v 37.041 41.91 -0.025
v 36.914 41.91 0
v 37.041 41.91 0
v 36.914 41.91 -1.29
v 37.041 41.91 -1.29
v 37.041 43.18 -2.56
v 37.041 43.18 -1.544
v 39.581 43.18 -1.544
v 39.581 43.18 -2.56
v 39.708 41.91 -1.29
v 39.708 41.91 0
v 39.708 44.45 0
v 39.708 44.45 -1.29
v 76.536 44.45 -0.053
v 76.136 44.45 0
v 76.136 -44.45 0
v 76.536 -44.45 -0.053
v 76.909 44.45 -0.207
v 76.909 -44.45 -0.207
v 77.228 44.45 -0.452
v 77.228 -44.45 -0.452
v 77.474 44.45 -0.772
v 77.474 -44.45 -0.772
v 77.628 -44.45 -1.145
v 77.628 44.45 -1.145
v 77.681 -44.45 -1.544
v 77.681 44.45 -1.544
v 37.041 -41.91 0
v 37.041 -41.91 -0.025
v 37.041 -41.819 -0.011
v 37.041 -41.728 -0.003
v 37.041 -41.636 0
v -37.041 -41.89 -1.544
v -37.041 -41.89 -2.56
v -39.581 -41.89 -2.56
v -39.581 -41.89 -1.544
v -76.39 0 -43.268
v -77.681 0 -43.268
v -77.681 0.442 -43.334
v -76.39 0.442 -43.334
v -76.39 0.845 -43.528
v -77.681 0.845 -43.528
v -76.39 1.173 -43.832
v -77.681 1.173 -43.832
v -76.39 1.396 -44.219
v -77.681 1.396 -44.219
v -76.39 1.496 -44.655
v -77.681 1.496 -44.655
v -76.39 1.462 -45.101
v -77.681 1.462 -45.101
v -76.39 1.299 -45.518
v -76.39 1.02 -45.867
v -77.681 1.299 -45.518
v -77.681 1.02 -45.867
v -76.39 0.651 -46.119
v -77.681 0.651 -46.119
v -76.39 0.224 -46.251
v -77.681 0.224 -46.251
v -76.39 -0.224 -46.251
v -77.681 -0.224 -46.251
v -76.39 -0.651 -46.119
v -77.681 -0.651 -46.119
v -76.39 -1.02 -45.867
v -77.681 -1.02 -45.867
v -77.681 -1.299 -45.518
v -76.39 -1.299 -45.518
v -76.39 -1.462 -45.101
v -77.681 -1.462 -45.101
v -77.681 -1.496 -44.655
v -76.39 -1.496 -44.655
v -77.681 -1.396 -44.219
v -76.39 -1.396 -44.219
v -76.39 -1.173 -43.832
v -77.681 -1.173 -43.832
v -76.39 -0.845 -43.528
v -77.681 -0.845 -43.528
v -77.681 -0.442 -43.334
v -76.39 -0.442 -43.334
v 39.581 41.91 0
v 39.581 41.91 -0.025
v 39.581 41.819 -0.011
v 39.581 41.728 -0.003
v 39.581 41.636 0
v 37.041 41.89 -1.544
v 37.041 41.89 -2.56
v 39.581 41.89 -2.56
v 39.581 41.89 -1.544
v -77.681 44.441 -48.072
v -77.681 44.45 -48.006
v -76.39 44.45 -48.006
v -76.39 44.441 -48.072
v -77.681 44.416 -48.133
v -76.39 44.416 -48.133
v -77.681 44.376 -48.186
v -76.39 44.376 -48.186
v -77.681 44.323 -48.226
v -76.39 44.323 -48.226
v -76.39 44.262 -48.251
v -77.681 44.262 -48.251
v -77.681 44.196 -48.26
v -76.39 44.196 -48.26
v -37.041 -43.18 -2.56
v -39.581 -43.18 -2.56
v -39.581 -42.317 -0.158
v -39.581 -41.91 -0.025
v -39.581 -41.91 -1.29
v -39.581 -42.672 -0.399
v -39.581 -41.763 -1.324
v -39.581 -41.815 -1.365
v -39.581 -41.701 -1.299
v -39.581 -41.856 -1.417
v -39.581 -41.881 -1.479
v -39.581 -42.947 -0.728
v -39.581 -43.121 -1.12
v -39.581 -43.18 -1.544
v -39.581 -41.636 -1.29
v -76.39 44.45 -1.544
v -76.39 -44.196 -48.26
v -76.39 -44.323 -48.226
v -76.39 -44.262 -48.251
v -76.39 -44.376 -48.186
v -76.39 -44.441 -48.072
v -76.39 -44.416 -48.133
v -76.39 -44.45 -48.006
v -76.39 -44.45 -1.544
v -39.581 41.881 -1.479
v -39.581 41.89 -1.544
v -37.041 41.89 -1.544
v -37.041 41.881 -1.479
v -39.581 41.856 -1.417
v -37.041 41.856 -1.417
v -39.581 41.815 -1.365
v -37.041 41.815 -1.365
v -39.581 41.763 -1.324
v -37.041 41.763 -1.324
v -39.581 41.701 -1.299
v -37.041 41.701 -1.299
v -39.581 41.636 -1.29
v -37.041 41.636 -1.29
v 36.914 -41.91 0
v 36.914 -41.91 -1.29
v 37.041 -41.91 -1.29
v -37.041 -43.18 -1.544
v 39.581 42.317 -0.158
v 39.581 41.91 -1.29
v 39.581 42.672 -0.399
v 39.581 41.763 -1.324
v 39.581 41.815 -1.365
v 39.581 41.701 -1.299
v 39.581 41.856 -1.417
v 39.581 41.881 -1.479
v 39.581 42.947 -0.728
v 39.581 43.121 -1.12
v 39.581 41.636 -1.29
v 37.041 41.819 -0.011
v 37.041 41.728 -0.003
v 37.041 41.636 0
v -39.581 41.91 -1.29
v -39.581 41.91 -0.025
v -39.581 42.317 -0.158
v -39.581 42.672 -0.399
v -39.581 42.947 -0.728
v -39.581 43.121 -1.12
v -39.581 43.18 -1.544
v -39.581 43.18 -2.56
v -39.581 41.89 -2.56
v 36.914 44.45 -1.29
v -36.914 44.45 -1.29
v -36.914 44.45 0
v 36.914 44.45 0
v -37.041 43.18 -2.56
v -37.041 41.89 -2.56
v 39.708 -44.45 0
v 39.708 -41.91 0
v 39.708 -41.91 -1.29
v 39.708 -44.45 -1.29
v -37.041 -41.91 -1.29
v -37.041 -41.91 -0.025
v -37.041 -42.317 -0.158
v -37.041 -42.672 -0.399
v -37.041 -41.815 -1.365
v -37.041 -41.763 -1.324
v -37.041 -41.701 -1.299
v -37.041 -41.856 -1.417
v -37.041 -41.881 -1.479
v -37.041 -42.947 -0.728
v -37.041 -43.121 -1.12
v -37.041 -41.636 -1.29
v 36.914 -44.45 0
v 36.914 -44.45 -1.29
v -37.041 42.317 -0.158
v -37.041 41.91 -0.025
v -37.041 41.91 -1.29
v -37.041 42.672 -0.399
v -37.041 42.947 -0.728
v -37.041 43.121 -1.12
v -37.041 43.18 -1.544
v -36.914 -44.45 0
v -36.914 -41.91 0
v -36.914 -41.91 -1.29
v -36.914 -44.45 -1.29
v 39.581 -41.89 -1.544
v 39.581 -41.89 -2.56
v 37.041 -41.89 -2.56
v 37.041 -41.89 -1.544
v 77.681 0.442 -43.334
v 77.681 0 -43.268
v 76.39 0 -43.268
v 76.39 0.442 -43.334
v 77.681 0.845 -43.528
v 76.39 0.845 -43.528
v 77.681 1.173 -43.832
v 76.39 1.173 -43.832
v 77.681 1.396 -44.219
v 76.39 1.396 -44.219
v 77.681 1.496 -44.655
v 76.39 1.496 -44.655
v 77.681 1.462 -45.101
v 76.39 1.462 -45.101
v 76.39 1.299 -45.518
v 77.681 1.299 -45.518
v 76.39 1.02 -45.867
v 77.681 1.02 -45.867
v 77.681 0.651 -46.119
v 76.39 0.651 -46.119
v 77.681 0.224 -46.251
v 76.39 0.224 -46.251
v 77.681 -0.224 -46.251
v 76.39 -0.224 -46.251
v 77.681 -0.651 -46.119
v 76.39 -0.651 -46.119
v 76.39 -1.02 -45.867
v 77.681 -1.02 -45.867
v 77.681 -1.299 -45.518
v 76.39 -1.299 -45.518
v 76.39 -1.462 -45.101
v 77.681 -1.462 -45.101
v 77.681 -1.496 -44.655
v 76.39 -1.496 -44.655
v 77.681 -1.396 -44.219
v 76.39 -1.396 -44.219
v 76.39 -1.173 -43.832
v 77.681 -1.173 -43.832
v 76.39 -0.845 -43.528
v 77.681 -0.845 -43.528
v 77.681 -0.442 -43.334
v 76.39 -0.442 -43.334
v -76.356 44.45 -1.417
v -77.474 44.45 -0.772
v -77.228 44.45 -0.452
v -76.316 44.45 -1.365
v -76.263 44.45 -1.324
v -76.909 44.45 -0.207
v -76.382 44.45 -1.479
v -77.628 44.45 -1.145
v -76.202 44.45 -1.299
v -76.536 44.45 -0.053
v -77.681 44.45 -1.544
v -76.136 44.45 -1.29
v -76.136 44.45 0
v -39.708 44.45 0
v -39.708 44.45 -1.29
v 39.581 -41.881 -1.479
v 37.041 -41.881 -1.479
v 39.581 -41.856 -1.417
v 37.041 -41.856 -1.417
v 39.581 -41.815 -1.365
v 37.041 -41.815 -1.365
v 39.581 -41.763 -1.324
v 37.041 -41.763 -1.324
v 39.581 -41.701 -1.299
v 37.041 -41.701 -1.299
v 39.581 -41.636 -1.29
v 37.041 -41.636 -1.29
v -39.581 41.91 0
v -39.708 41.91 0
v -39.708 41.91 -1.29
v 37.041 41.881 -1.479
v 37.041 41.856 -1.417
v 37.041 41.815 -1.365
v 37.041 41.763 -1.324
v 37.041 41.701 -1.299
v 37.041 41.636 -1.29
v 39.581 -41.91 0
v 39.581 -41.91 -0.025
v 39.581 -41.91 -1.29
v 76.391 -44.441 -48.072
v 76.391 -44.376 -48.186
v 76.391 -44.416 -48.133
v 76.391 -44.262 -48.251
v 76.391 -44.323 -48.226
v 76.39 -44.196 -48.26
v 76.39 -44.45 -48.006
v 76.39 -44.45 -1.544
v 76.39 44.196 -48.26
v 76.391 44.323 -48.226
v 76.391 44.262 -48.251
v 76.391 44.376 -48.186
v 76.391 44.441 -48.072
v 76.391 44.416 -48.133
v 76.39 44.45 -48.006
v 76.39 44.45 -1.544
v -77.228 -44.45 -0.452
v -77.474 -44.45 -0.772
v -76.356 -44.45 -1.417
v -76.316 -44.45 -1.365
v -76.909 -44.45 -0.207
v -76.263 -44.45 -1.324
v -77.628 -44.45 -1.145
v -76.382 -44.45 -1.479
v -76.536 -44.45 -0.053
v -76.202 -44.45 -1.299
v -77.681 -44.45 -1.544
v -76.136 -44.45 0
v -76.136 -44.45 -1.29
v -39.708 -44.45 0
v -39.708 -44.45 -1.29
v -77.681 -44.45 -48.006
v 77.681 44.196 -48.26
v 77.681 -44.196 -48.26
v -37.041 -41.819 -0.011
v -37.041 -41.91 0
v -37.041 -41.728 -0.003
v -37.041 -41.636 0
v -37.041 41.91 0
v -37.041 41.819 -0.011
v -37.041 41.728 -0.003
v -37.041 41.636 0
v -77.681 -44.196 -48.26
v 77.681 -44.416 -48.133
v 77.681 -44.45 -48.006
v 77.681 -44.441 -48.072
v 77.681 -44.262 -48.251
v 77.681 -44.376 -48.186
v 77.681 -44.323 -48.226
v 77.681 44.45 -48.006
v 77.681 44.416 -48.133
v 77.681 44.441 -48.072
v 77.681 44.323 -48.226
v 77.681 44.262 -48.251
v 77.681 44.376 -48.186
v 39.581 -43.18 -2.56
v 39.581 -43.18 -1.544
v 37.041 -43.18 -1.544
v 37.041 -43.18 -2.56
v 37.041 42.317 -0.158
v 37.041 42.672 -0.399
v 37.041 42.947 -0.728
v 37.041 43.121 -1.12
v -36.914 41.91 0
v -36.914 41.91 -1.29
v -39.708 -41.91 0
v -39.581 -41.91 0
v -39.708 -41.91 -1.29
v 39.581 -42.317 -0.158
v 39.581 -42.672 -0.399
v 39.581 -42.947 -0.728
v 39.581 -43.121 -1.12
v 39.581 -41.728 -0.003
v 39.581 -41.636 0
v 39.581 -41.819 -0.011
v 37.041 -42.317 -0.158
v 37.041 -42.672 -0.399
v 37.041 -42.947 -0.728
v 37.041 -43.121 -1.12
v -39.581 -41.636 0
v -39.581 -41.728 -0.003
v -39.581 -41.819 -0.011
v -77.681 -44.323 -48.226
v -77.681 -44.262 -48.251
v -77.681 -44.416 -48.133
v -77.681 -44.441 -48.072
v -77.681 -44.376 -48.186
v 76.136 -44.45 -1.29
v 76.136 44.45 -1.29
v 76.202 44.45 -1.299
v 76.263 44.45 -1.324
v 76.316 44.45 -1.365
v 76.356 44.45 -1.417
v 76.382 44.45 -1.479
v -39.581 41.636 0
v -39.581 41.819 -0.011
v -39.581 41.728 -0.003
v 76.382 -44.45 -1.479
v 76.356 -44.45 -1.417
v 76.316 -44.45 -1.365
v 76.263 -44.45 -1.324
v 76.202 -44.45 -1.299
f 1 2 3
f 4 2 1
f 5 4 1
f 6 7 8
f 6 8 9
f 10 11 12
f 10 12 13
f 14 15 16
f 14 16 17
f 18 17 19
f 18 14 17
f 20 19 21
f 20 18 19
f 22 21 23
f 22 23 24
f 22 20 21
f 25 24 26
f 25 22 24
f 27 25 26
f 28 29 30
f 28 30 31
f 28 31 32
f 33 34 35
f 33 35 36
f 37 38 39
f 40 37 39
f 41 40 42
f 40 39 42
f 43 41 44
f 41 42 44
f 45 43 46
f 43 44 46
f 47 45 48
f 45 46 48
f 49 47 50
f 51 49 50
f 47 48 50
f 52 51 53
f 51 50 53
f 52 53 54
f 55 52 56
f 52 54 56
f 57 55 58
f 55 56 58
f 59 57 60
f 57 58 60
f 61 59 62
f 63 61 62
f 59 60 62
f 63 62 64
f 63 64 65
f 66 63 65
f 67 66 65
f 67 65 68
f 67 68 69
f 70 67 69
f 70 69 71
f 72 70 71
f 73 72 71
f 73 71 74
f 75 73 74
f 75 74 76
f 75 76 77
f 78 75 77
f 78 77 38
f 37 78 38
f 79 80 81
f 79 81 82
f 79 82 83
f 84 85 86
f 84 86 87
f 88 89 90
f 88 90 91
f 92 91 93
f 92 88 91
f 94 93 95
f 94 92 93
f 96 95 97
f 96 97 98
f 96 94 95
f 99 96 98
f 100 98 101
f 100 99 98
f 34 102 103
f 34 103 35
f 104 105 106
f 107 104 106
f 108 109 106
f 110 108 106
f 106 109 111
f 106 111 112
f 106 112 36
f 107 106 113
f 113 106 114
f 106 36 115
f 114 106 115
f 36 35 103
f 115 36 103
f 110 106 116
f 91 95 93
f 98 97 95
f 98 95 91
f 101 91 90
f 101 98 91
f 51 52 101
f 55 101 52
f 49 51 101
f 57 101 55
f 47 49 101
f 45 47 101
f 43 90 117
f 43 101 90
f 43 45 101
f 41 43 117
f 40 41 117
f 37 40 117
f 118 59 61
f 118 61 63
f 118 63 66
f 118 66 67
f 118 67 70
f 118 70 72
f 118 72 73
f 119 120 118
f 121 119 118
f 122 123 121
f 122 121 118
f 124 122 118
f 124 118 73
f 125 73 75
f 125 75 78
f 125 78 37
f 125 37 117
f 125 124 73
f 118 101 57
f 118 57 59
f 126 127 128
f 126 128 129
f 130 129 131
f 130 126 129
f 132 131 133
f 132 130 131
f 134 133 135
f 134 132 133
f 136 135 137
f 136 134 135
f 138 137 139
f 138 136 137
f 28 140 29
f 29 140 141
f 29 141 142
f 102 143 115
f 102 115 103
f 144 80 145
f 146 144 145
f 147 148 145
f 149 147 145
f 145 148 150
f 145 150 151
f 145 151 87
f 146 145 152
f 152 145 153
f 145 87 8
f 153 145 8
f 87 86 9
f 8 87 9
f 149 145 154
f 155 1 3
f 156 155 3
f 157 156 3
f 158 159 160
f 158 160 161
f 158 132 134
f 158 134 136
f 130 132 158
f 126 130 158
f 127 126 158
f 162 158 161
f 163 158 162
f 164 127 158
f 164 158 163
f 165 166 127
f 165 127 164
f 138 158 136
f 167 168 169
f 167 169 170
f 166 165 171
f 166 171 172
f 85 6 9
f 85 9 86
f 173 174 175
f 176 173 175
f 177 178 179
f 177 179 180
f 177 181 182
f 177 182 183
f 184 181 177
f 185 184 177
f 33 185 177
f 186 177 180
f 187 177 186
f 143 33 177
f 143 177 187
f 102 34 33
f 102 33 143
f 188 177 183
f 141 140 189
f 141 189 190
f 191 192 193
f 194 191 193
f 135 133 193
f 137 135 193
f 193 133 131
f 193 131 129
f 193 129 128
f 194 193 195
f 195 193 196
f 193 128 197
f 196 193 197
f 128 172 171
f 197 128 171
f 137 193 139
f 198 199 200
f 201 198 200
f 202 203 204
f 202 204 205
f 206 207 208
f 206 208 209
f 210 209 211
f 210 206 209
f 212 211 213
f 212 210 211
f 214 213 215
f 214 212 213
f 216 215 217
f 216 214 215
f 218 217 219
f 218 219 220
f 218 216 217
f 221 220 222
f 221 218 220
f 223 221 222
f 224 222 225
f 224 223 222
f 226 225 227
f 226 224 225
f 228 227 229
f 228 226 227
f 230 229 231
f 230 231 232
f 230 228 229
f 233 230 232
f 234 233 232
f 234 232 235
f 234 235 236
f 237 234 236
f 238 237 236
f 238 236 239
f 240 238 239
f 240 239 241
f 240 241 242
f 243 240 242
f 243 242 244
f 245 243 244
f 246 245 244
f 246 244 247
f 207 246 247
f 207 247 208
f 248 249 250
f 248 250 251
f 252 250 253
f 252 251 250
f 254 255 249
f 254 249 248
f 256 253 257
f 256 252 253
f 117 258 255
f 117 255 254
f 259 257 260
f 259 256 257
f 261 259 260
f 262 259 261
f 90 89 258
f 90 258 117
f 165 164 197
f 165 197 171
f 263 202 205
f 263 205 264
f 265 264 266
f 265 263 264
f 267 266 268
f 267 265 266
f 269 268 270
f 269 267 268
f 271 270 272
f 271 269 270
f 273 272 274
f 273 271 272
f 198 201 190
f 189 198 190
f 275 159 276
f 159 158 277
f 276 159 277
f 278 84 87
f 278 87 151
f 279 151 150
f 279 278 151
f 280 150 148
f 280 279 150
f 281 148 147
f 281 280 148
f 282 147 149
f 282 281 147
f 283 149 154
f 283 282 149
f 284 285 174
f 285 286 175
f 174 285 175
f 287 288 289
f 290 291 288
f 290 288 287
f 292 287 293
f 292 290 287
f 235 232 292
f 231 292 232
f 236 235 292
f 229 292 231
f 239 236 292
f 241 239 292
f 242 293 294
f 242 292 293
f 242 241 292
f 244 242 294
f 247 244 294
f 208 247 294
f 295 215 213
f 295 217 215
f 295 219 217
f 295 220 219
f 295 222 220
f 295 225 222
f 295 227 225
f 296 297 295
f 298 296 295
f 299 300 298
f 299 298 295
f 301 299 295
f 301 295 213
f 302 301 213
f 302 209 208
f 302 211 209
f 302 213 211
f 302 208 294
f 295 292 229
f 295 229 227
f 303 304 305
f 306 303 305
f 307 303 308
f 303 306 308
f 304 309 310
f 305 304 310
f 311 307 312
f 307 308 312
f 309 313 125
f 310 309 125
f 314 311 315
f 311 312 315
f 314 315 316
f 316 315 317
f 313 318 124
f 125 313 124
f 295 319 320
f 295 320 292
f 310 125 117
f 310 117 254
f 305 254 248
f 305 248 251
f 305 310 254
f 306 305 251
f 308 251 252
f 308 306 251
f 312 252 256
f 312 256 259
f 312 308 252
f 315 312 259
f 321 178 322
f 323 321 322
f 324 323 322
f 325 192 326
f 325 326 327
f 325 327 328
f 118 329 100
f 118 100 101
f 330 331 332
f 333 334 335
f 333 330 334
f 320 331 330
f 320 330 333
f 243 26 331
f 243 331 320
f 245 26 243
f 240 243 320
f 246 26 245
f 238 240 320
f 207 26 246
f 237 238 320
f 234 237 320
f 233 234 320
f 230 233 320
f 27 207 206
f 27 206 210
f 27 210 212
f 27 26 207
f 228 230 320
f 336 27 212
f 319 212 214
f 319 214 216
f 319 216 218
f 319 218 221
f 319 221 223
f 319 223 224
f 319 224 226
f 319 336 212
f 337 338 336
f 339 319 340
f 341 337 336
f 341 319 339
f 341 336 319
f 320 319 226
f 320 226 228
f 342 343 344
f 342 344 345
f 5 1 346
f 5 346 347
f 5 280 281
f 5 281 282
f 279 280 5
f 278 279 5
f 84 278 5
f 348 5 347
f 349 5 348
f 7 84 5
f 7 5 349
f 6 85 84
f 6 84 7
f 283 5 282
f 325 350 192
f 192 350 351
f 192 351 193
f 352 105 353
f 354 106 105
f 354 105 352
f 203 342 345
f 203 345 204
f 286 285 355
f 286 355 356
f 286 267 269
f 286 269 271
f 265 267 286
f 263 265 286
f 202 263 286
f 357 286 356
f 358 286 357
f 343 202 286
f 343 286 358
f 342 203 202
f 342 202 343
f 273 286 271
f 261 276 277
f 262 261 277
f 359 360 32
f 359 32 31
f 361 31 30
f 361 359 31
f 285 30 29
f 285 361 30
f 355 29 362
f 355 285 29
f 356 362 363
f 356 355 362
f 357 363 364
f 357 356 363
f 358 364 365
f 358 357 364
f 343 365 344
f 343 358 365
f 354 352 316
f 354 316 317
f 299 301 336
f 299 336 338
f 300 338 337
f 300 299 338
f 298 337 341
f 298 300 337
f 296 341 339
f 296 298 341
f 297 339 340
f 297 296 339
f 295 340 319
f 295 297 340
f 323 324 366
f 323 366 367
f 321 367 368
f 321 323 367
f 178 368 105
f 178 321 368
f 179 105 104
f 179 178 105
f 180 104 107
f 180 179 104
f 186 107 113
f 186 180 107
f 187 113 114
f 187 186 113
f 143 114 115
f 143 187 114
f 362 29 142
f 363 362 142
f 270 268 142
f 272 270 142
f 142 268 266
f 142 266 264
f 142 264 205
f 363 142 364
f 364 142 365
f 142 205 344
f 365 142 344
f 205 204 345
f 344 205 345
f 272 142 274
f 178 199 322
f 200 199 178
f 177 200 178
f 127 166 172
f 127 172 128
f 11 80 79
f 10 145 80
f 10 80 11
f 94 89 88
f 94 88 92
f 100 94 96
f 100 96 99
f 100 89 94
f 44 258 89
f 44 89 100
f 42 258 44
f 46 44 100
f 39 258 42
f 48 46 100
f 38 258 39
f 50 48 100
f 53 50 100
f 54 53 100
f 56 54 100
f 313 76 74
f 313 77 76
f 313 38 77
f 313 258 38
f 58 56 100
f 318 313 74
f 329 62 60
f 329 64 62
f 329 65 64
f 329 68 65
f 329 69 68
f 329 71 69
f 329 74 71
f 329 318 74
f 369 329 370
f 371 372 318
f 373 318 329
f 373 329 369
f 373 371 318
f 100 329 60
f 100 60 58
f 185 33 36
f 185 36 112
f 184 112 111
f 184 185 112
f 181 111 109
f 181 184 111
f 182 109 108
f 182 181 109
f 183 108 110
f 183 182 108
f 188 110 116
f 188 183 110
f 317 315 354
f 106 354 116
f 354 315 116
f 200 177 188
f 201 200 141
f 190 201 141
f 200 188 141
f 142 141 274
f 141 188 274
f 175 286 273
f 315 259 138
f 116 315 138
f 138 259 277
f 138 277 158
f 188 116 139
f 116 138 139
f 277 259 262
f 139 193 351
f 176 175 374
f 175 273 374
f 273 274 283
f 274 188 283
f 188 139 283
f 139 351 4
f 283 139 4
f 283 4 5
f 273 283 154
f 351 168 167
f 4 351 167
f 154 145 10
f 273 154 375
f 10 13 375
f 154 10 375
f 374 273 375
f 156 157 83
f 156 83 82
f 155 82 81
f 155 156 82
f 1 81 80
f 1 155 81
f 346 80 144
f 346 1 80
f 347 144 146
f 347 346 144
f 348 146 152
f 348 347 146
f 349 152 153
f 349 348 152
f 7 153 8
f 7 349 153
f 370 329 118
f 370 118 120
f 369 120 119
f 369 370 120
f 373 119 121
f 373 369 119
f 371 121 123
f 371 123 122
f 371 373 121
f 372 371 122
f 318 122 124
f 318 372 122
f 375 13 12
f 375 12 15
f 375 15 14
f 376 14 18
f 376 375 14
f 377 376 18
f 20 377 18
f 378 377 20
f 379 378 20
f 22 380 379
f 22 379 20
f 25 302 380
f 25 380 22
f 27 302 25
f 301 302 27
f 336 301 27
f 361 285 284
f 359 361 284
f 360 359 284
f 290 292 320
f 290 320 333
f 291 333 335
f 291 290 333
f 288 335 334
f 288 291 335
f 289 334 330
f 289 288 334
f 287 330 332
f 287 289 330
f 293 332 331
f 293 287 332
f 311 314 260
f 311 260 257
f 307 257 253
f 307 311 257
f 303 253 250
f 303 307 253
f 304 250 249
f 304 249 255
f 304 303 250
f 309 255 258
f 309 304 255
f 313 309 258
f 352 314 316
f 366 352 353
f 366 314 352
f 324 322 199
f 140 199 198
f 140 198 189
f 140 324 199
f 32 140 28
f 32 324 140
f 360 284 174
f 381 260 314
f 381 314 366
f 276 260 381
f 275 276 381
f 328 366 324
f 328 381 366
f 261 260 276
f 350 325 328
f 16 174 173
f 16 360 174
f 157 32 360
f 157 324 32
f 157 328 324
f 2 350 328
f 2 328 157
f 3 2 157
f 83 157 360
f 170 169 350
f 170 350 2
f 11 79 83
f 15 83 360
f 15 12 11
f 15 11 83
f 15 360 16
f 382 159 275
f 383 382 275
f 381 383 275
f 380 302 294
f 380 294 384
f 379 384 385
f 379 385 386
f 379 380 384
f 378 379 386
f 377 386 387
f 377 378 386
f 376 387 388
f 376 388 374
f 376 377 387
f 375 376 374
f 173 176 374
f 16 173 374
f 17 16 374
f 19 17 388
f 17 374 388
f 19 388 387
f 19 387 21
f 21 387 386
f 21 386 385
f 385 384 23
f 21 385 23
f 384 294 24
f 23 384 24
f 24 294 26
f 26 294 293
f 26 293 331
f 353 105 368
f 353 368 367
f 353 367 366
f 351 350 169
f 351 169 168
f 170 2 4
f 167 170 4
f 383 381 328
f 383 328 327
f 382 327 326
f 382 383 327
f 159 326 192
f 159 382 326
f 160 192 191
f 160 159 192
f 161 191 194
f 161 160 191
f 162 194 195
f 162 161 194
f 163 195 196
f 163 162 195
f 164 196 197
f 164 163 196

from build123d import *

# Parameters (mm, degrees)
SKETCH1_W                      = 152.4
SKETCH1_H                      = 88.9
BASE_FLANGE1_DEPTH             = 1.29032
EDGE_FLANGE1_STRIP_W           = 5.85978
EDGE_FLANGE1_STRIP_H           = 1.29032
EDGE_FLANGE1_STRIP_CUT_DEPTH   = 88.9
EDGE_FLANGE1_STRIP_2_W         = 5.85978
EDGE_FLANGE1_STRIP_2_H         = 1.29032
EDGE_FLANGE1_STRIP_CUT_2_DEPTH = 88.9
EDGE_FLANGE1_DEPTH             = 88.9
EDGE_FLANGE1_BEND_DEPTH        = 88.9
M3X0_5_TAPPED_HOLE1_REACH      = 170.648
M3X0_5_TAPPED_HOLE1_BORE_R     = 1.5
BREAK_CORNER1_START            = -77.68082
BREAK_CORNER1_DEPTH            = 155.36164
CUT_THICKEN1_START             = 41.91
CUT_THICKEN1_OUTLINE_W         = 0.127
CUT_THICKEN1_OUTLINE_H         = 1.29032
CUT_THICKEN1_DEPTH             = 2.54
CUT_THICKEN2_START             = 41.91
CUT_THICKEN2_OUTLINE_W         = 0.127
CUT_THICKEN2_OUTLINE_H         = 1.29032
CUT_THICKEN2_DEPTH             = 2.54
MIRROR7_START                  = 41.91
MIRROR7_COPY_1_SKETCH_W        = 0.127
MIRROR7_COPY_1_SKETCH_H        = 1.29032
MIRROR7_COPY_1_DEPTH           = 2.54
MIRROR7_COPY_2_SKETCH_W        = 0.127
MIRROR7_COPY_2_SKETCH_H        = 1.29032
MIRROR7_COPY_2_DEPTH           = 2.54
MOVE_FACE1_BY                  = 1.27
MOVE_FACE1_2_BY                = 1.27
MOVE_FACE1_3_BY                = 1.27
MOVE_FACE1_4_BY                = 1.27
EDGE_FLANGE2_STRIP_W           = 5.66928
EDGE_FLANGE2_STRIP_H           = 1.29032
EDGE_FLANGE2_STRIP_CUT_DEPTH   = 2.54
EDGE_FLANGE2_STRIP_2_W         = 5.66928
EDGE_FLANGE2_STRIP_2_H         = 1.29032
EDGE_FLANGE2_STRIP_CUT_2_DEPTH = 2.54
EDGE_FLANGE2_STRIP_3_W         = 5.66928
EDGE_FLANGE2_STRIP_3_H         = 1.29032
EDGE_FLANGE2_STRIP_CUT_3_DEPTH = 2.54
EDGE_FLANGE2_STRIP_4_W         = 5.66928
EDGE_FLANGE2_STRIP_4_H         = 1.29032
EDGE_FLANGE2_STRIP_CUT_4_DEPTH = 2.54
EDGE_FLANGE2_DEPTH             = 2.54
EDGE_FLANGE2_BEND_DEPTH        = 2.54
EDGE_FLANGE2_BEND_2_DEPTH      = 2.54
EDGE_FLANGE2_BEND_3_DEPTH      = 2.54


# Read off the part's stored shape, not the designer's step: Break-Corner1, Cut-Thicken1, Cut-Thicken2
# Sheet-metal steps are written as plain solids
with BuildPart() as part:
    # Sketch1 → Base-Flange1 (new body)
    with BuildSketch(Plane.XY):
        Rectangle(SKETCH1_W, SKETCH1_H)
    extrude(amount=-BASE_FLANGE1_DEPTH)

    # Edge-Flange1 strip (across the edge) → Edge-Flange1 strip cut (cut)
    with BuildSketch(Plane(origin=(-76.3905, -44.45, -1.29032), x_dir=(1, 0, 0), z_dir=(0, 1, 0))):
        with Locations((-2.67589, -0.64516)):
            Rectangle(EDGE_FLANGE1_STRIP_W, EDGE_FLANGE1_STRIP_H)
    extrude(amount=EDGE_FLANGE1_STRIP_CUT_DEPTH, mode=Mode.SUBTRACT)

    # Edge-Flange1 strip 2 (across the edge) → Edge-Flange1 strip cut 2 (cut)
    with BuildSketch(Plane(origin=(76.3905, 44.45, -1.29032), x_dir=(-1, 0, 0), z_dir=(0, -1, 0))):
        with Locations((-2.67589, -0.64516)):
            Rectangle(EDGE_FLANGE1_STRIP_2_W, EDGE_FLANGE1_STRIP_2_H)
    extrude(amount=EDGE_FLANGE1_STRIP_CUT_2_DEPTH, mode=Mode.SUBTRACT)

    # Edge-Flange1 section (across the edge) → Edge-Flange1 (add)
    with BuildSketch(Plane(origin=(-76.3905, -44.45, -1.29032), x_dir=(1, 0, 0), z_dir=(0, 1, 0))):
        with BuildLine():
            Line((-1.29032, 0.254), (-1.29032, 46.96968))
            Line((-1.29032, 46.96968), (0, 46.96968))
            Line((0, 46.96968), (0, 0.254))
            ThreePointArc((0, 0.254), (0.074394878, 0.074394878), (0.254, 0))
            Line((0.254, 0), (0.254, -1.29032))
            ThreePointArc((0.254, -1.29032), (-0.837999144, -0.837999144), (-1.29032, 0.254))
        make_face()
    extrude(amount=EDGE_FLANGE1_DEPTH)

    # Edge-Flange1 section 2 (across the edge) → Edge-Flange1 bend (add)
    with BuildSketch(Plane(origin=(76.3905, 44.45, -1.29032), x_dir=(-1, 0, 0), z_dir=(0, -1, 0))):
        with BuildLine():
            Line((-1.29032, 0.254), (-1.29032, 46.96968))
            Line((-1.29032, 46.96968), (0, 46.96968))
            Line((0, 46.96968), (0, 0.254))
            ThreePointArc((0, 0.254), (0.074394878, 0.074394878), (0.254, 0))
            Line((0.254, 0), (0.254, -1.29032))
            ThreePointArc((0.254, -1.29032), (-0.837999144, -0.837999144), (-1.29032, 0.254))
        make_face()
    extrude(amount=EDGE_FLANGE1_BEND_DEPTH)

    # M3x0.5 Tapped Hole1 bore → M3x0.5 Tapped Hole1 (cut, up to next)
    with BuildSketch(Plane.ZY.offset(77.68082), mode=Mode.PRIVATE) as m3x0_5_tapped_hole1_sk1:
        with Locations((-44.7675, 0)):
            Circle(M3X0_5_TAPPED_HOLE1_BORE_R)
    m3x0_5_tapped_hole1_tool1 = extrude(m3x0_5_tapped_hole1_sk1.sketch, amount=-M3X0_5_TAPPED_HOLE1_REACH, mode=Mode.PRIVATE) & part.part
    m3x0_5_tapped_hole1 = m3x0_5_tapped_hole1_tool1.solids().sort_by_distance((-77.68082, 0, -44.7675))[0]
    add(m3x0_5_tapped_hole1, mode=Mode.SUBTRACT)

    # Mirror1: M3x0.5 Tapped Hole1 across plane
    add(m3x0_5_tapped_hole1.mirror(Plane(origin=(0, 0, 0), x_dir=(0, 0, 1), z_dir=(1, 0, 0))), mode=Mode.SUBTRACT)

    # Break-Corner1 outline → Break-Corner1 (cut)
    with BuildSketch(Plane.YZ.offset(BREAK_CORNER1_START)):
        with BuildLine():
            Line((44.45, -48.26), (44.45, -48.006))
            ThreePointArc((44.45, -48.006), (44.375605122, -48.185605122), (44.196, -48.26))
            Line((44.196, -48.26), (44.45, -48.26))
        make_face()
        with BuildLine():
            Line((-44.45, -48.26), (-44.196, -48.26))
            ThreePointArc((-44.196, -48.26), (-44.375605122, -48.185605122), (-44.45, -48.006))
            Line((-44.45, -48.006), (-44.45, -48.26))
        make_face()
    extrude(amount=BREAK_CORNER1_DEPTH, mode=Mode.SUBTRACT)

    # Cut-Thicken1 outline → Cut-Thicken1 (cut)
    with BuildSketch(Plane(origin=(0, 0, 0), x_dir=(1, 0, 0), z_dir=(0, 1, 0)).offset(CUT_THICKEN1_START)):
        with Locations((36.97732, 0.64516)):
            Rectangle(CUT_THICKEN1_OUTLINE_W, CUT_THICKEN1_OUTLINE_H)
    cut_thicken1 = extrude(amount=CUT_THICKEN1_DEPTH, mode=Mode.SUBTRACT)

    # Cut-Thicken2 outline → Cut-Thicken2 (cut)
    with BuildSketch(Plane(origin=(0, 0, 0), x_dir=(1, 0, 0), z_dir=(0, 1, 0)).offset(CUT_THICKEN2_START)):
        with Locations((39.64432, 0.64516)):
            Rectangle(CUT_THICKEN2_OUTLINE_W, CUT_THICKEN2_OUTLINE_H)
    cut_thicken2 = extrude(amount=CUT_THICKEN2_DEPTH, mode=Mode.SUBTRACT)

    # Mirror6: Cut-Thicken1, Cut-Thicken2 across plane
    add(cut_thicken1.mirror(Plane(origin=(0, 0, 0), x_dir=(0, 0, 1), z_dir=(1, 0, 0))), mode=Mode.SUBTRACT)
    add(cut_thicken2.mirror(Plane(origin=(0, 0, 0), x_dir=(0, 0, 1), z_dir=(1, 0, 0))), mode=Mode.SUBTRACT)

    # Mirror7: Cut-Thicken1, Cut-Thicken2 across plane
    add(cut_thicken1.mirror(Plane.ZX), mode=Mode.SUBTRACT)
    add(cut_thicken2.mirror(Plane.ZX), mode=Mode.SUBTRACT)

    # Mirror7 copy 1 sketch → Mirror7 copy 1 (cut)
    with BuildSketch(Plane(origin=(0, 0, 0), x_dir=(-1, 0, 0), z_dir=(0, -1, 0)).offset(MIRROR7_START)):
        with Locations((36.97732, 0.64516)):
            Rectangle(MIRROR7_COPY_1_SKETCH_W, MIRROR7_COPY_1_SKETCH_H)
    extrude(amount=MIRROR7_COPY_1_DEPTH, mode=Mode.SUBTRACT)

    # Mirror7 copy 2 sketch → Mirror7 copy 2 (cut)
    with BuildSketch(Plane(origin=(0, 0, 0), x_dir=(-1, 0, 0), z_dir=(0, -1, 0)).offset(MIRROR7_START)):
        with Locations((39.64432, 0.64516)):
            Rectangle(MIRROR7_COPY_2_SKETCH_W, MIRROR7_COPY_2_SKETCH_H)
    extrude(amount=MIRROR7_COPY_2_DEPTH, mode=Mode.SUBTRACT)

    # Move Face1: a face moved inward by 1.27
    extrude(part.faces().sort_by_distance((-38.31082, -44.45, -0.64516))[0], amount=MOVE_FACE1_BY, dir=(0, 1, 0), mode=Mode.SUBTRACT)

    # Move Face1 2: a face moved inward by 1.27
    extrude(part.faces().sort_by_distance((38.31082, -44.45, -0.64516))[0], amount=MOVE_FACE1_2_BY, dir=(0, 1, 0), mode=Mode.SUBTRACT)

    # Move Face1 3: a face moved inward by 1.27
    extrude(part.faces().sort_by_distance((-38.31082, 44.45, -0.64516))[0], amount=MOVE_FACE1_3_BY, dir=(0, -1, 0), mode=Mode.SUBTRACT)

    # Move Face1 4: a face moved inward by 1.27
    extrude(part.faces().sort_by_distance((38.31082, 44.45, -0.64516))[0], amount=MOVE_FACE1_4_BY, dir=(0, -1, 0), mode=Mode.SUBTRACT)

    # Edge-Flange2 strip (across the edge) → Edge-Flange2 strip cut (cut)
    with BuildSketch(Plane(origin=(37.04082, 43.18, -1.29032), x_dir=(0, -1, 0), z_dir=(1, 0, 0))):
        with Locations((-1.29032, -0.64516)):
            Rectangle(EDGE_FLANGE2_STRIP_W, EDGE_FLANGE2_STRIP_H)
    extrude(amount=EDGE_FLANGE2_STRIP_CUT_DEPTH, mode=Mode.SUBTRACT)

    # Edge-Flange2 strip 2 (across the edge) → Edge-Flange2 strip cut 2 (cut)
    with BuildSketch(Plane(origin=(-39.58082, 43.18, -1.29032), x_dir=(0, -1, 0), z_dir=(1, 0, 0))):
        with Locations((-1.29032, -0.64516)):
            Rectangle(EDGE_FLANGE2_STRIP_2_W, EDGE_FLANGE2_STRIP_2_H)
    extrude(amount=EDGE_FLANGE2_STRIP_CUT_2_DEPTH, mode=Mode.SUBTRACT)

    # Edge-Flange2 strip 3 (across the edge) → Edge-Flange2 strip cut 3 (cut)
    with BuildSketch(Plane(origin=(39.58082, -43.18, -1.29032), x_dir=(0, 1, 0), z_dir=(-1, 0, 0))):
        with Locations((-1.29032, -0.64516)):
            Rectangle(EDGE_FLANGE2_STRIP_3_W, EDGE_FLANGE2_STRIP_3_H)
    extrude(amount=EDGE_FLANGE2_STRIP_CUT_3_DEPTH, mode=Mode.SUBTRACT)

    # Edge-Flange2 strip 4 (across the edge) → Edge-Flange2 strip cut 4 (cut)
    with BuildSketch(Plane(origin=(-37.04082, -43.18, -1.29032), x_dir=(0, 1, 0), z_dir=(-1, 0, 0))):
        with Locations((-1.29032, -0.64516)):
            Rectangle(EDGE_FLANGE2_STRIP_4_W, EDGE_FLANGE2_STRIP_4_H)
    extrude(amount=EDGE_FLANGE2_STRIP_CUT_4_DEPTH, mode=Mode.SUBTRACT)

    # Edge-Flange2 section (across the edge) → Edge-Flange2 (add)
    with BuildSketch(Plane(origin=(37.04082, 43.18, -1.29032), x_dir=(0, -1, 0), z_dir=(1, 0, 0))):
        with BuildLine():
            Line((0, 0.254), (0, 1.27))
            Line((0, 1.27), (1.29032, 1.27))
            Line((1.29032, 1.27), (1.29032, 0.254))
            ThreePointArc((1.29032, 0.254), (1.364714878, 0.074394878), (1.54432, 0))
            Line((1.54432, 0), (1.54432, -1.29032))
            ThreePointArc((1.54432, -1.29032), (0.452320856, -0.837999144), (0, 0.254))
        make_face()
    extrude(amount=EDGE_FLANGE2_DEPTH)

    # Edge-Flange2 section 2 (across the edge) → Edge-Flange2 bend (add)
    with BuildSketch(Plane(origin=(-39.58082, 43.18, -1.29032), x_dir=(0, -1, 0), z_dir=(1, 0, 0))):
        with BuildLine():
            Line((0, 0.254), (0, 1.27))
            Line((0, 1.27), (1.29032, 1.27))
            Line((1.29032, 1.27), (1.29032, 0.254))
            ThreePointArc((1.29032, 0.254), (1.364714878, 0.074394878), (1.54432, 0))
            Line((1.54432, 0), (1.54432, -1.29032))
            ThreePointArc((1.54432, -1.29032), (0.452320856, -0.837999144), (0, 0.254))
        make_face()
    extrude(amount=EDGE_FLANGE2_BEND_DEPTH)

    # Edge-Flange2 section 3 (across the edge) → Edge-Flange2 bend 2 (add)
    with BuildSketch(Plane(origin=(39.58082, -43.18, -1.29032), x_dir=(0, 1, 0), z_dir=(-1, 0, 0))):
        with BuildLine():
            Line((0, 0.254), (0, 1.27))
            Line((0, 1.27), (1.29032, 1.27))
            Line((1.29032, 1.27), (1.29032, 0.254))
            ThreePointArc((1.29032, 0.254), (1.364714878, 0.074394878), (1.54432, 0))
            Line((1.54432, 0), (1.54432, -1.29032))
            ThreePointArc((1.54432, -1.29032), (0.452320856, -0.837999144), (0, 0.254))
        make_face()
    extrude(amount=EDGE_FLANGE2_BEND_2_DEPTH)

    # Edge-Flange2 section 4 (across the edge) → Edge-Flange2 bend 3 (add)
    with BuildSketch(Plane(origin=(-37.04082, -43.18, -1.29032), x_dir=(0, 1, 0), z_dir=(-1, 0, 0))):
        with BuildLine():
            Line((0, 0.254), (0, 1.27))
            Line((0, 1.27), (1.29032, 1.27))
            Line((1.29032, 1.27), (1.29032, 0.254))
            ThreePointArc((1.29032, 0.254), (1.364714878, 0.074394878), (1.54432, 0))
            Line((1.54432, 0), (1.54432, -1.29032))
            ThreePointArc((1.54432, -1.29032), (0.452320856, -0.837999144), (0, 0.254))
        make_face()
    extrude(amount=EDGE_FLANGE2_BEND_3_DEPTH)


solid = part.part
